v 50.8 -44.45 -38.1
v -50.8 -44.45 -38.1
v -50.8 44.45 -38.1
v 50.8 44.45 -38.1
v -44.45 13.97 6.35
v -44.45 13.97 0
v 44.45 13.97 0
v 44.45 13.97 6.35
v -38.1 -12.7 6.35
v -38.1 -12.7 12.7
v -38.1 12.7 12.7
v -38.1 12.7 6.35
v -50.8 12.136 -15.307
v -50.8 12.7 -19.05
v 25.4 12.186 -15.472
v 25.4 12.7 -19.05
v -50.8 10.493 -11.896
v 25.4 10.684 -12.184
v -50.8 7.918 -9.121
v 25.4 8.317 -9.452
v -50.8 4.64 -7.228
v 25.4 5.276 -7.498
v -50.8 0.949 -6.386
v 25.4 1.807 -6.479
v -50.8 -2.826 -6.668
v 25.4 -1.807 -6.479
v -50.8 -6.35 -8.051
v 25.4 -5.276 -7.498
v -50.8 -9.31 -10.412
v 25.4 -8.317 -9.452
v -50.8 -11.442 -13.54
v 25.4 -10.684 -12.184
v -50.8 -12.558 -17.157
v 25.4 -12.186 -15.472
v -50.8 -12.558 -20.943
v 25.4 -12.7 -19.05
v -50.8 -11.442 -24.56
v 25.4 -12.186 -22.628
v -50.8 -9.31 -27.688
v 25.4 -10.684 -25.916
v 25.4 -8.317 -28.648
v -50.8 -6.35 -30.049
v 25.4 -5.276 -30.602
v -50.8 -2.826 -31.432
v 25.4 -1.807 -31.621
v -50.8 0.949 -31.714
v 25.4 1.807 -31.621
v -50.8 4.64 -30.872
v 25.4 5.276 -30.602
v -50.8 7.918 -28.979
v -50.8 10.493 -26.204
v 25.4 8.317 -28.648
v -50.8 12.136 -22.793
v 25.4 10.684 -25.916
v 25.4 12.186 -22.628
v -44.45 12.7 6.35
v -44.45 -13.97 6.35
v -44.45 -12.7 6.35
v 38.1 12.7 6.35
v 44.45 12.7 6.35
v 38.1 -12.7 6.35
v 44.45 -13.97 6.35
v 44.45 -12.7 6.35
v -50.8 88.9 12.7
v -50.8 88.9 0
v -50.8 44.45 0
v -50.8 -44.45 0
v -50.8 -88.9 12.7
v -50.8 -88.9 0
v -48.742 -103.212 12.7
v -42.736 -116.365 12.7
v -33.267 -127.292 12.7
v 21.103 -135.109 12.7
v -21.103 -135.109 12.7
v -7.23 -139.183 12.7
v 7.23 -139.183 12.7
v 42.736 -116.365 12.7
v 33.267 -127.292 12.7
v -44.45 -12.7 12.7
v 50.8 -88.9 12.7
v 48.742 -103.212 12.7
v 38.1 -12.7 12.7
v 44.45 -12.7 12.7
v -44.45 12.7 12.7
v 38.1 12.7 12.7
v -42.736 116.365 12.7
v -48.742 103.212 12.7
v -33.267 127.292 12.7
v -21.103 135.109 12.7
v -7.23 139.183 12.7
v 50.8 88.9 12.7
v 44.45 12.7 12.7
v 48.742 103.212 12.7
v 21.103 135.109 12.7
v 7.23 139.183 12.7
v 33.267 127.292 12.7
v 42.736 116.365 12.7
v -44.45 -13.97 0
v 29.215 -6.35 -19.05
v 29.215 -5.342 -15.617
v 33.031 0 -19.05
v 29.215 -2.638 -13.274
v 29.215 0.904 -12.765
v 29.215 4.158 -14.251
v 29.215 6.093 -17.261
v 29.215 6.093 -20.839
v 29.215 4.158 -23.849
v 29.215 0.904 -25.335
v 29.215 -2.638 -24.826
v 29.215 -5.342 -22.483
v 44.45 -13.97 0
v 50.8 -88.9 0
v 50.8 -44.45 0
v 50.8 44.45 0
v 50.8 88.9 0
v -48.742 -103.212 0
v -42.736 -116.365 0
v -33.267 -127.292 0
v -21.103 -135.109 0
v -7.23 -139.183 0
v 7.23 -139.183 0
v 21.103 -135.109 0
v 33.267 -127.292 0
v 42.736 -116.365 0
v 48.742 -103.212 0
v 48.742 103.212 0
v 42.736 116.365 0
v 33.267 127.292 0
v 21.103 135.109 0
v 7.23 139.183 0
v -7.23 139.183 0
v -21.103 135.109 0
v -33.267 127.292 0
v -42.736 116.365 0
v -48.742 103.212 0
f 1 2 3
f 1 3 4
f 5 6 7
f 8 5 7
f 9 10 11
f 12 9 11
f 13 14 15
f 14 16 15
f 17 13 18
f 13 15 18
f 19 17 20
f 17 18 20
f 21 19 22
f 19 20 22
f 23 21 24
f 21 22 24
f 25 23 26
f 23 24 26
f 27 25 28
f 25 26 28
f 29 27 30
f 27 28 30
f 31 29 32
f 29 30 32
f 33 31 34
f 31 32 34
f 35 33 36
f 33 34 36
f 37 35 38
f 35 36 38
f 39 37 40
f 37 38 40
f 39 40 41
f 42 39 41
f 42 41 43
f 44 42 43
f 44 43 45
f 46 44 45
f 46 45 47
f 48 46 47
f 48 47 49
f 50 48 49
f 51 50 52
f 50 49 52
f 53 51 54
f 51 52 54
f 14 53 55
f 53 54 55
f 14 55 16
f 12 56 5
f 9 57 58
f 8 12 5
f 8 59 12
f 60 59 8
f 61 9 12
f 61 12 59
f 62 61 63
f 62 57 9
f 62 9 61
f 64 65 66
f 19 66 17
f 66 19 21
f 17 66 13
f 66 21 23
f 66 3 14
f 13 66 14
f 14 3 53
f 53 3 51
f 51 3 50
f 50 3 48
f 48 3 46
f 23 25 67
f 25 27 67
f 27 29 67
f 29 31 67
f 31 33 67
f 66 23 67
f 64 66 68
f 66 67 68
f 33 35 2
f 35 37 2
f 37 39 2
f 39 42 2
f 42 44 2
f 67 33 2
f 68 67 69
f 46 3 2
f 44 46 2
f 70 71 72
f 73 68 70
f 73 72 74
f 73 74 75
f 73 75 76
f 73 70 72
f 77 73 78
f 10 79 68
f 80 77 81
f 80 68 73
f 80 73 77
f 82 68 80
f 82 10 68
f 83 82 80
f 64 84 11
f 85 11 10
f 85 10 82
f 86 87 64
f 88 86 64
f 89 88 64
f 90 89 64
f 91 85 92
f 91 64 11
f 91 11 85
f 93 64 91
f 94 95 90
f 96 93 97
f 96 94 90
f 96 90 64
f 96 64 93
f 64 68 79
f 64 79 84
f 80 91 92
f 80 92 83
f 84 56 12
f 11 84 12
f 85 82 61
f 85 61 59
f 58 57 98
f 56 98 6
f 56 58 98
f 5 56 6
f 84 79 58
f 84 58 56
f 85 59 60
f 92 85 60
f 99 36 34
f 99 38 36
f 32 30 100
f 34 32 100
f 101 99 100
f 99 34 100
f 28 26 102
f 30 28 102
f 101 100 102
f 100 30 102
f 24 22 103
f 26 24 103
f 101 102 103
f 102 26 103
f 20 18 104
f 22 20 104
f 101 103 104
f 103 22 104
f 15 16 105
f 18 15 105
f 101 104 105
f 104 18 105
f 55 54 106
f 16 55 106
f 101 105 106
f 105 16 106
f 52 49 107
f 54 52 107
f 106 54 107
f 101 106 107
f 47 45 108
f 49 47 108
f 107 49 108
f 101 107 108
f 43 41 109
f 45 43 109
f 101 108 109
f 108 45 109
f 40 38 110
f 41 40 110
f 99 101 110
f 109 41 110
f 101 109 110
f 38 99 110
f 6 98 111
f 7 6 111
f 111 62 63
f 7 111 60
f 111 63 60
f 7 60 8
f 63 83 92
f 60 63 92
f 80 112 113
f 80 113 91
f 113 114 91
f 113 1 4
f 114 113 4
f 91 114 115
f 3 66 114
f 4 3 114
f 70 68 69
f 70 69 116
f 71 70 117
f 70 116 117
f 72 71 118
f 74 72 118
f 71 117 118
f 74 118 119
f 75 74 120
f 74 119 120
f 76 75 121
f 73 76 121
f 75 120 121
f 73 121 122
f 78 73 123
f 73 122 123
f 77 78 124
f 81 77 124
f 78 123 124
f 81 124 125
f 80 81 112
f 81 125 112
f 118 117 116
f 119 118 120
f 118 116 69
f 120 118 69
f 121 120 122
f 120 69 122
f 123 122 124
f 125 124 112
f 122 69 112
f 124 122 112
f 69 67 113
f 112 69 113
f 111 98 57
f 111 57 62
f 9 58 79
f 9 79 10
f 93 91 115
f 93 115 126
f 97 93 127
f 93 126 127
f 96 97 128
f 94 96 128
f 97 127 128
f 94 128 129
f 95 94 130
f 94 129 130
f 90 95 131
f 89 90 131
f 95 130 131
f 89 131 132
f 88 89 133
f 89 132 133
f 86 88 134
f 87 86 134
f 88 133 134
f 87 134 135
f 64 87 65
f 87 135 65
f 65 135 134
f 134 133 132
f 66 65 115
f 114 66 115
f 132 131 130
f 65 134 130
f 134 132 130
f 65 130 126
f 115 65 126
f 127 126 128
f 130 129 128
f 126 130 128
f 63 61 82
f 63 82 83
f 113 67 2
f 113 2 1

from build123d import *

# Parameters (mm, degrees)
F1_DEPTH = 12.7
F2_W     = 101.6
F2_H     = 88.9
F3_DEPTH = 38.1
F5_D     = 25.4
F5_DEPTH = 76.2
F5_TIP   = 7.6309298617
F6_W     = 6.35
F6_H     = 25.4
F7_DEPTH = 6.35
F8_W     = 88.9
F8_H     = 27.94
F9_DEPTH = 6.35


with BuildPart() as f1:
    # F0 (on Top) → F1 (new body)
    with BuildSketch(Plane.XY):
        with BuildLine():
            Line((-50.8, 88.9), (-50.8, -88.9))
            ThreePointArc((-50.8, -88.9), (0, -139.7), (50.8, -88.9))
            Line((50.8, -88.9), (50.8, 88.9))
            ThreePointArc((50.8, 88.9), (0, 139.7), (-50.8, 88.9))
        make_face()
    extrude(amount=F1_DEPTH)

    # F2 (on face) → F3 (join)
    with BuildSketch(Plane(origin=(0, 0, 0), x_dir=(1, 0, 0), z_dir=(0, 0, -1))):
        Rectangle(F2_W, F2_H)
    extrude(amount=F3_DEPTH)

    # F5
    with Locations(Plane(origin=(-50.8, 0, 0), x_dir=(0, -1, 0), z_dir=(-1, 0, 0))):
        with Locations((0, -19.05)):
            Hole(F5_D / 2, depth=F5_DEPTH)
            with Locations((0, 0, -(F5_DEPTH + F5_TIP / 2))):  # 118° drill point
                Cone(0, F5_D / 2, F5_TIP, mode=Mode.SUBTRACT)

    # F6 (on face) → F7 (cut)
    with BuildSketch(Plane.XY.offset(12.7)):
        with Locations((-41.275, 0)):
            Rectangle(F6_W, F6_H)
        with Locations((41.275, 0)):
            Rectangle(F6_W, F6_H)
    extrude(amount=-F7_DEPTH, mode=Mode.SUBTRACT)

    # F8 (on face) → F9 (cut)
    with BuildSketch(Plane(origin=(0, 0, 0), x_dir=(1, 0, 0), z_dir=(0, 0, -1))):
        Rectangle(F8_W, F8_H)
    extrude(amount=-F9_DEPTH, mode=Mode.SUBTRACT)


solid = f1.part
